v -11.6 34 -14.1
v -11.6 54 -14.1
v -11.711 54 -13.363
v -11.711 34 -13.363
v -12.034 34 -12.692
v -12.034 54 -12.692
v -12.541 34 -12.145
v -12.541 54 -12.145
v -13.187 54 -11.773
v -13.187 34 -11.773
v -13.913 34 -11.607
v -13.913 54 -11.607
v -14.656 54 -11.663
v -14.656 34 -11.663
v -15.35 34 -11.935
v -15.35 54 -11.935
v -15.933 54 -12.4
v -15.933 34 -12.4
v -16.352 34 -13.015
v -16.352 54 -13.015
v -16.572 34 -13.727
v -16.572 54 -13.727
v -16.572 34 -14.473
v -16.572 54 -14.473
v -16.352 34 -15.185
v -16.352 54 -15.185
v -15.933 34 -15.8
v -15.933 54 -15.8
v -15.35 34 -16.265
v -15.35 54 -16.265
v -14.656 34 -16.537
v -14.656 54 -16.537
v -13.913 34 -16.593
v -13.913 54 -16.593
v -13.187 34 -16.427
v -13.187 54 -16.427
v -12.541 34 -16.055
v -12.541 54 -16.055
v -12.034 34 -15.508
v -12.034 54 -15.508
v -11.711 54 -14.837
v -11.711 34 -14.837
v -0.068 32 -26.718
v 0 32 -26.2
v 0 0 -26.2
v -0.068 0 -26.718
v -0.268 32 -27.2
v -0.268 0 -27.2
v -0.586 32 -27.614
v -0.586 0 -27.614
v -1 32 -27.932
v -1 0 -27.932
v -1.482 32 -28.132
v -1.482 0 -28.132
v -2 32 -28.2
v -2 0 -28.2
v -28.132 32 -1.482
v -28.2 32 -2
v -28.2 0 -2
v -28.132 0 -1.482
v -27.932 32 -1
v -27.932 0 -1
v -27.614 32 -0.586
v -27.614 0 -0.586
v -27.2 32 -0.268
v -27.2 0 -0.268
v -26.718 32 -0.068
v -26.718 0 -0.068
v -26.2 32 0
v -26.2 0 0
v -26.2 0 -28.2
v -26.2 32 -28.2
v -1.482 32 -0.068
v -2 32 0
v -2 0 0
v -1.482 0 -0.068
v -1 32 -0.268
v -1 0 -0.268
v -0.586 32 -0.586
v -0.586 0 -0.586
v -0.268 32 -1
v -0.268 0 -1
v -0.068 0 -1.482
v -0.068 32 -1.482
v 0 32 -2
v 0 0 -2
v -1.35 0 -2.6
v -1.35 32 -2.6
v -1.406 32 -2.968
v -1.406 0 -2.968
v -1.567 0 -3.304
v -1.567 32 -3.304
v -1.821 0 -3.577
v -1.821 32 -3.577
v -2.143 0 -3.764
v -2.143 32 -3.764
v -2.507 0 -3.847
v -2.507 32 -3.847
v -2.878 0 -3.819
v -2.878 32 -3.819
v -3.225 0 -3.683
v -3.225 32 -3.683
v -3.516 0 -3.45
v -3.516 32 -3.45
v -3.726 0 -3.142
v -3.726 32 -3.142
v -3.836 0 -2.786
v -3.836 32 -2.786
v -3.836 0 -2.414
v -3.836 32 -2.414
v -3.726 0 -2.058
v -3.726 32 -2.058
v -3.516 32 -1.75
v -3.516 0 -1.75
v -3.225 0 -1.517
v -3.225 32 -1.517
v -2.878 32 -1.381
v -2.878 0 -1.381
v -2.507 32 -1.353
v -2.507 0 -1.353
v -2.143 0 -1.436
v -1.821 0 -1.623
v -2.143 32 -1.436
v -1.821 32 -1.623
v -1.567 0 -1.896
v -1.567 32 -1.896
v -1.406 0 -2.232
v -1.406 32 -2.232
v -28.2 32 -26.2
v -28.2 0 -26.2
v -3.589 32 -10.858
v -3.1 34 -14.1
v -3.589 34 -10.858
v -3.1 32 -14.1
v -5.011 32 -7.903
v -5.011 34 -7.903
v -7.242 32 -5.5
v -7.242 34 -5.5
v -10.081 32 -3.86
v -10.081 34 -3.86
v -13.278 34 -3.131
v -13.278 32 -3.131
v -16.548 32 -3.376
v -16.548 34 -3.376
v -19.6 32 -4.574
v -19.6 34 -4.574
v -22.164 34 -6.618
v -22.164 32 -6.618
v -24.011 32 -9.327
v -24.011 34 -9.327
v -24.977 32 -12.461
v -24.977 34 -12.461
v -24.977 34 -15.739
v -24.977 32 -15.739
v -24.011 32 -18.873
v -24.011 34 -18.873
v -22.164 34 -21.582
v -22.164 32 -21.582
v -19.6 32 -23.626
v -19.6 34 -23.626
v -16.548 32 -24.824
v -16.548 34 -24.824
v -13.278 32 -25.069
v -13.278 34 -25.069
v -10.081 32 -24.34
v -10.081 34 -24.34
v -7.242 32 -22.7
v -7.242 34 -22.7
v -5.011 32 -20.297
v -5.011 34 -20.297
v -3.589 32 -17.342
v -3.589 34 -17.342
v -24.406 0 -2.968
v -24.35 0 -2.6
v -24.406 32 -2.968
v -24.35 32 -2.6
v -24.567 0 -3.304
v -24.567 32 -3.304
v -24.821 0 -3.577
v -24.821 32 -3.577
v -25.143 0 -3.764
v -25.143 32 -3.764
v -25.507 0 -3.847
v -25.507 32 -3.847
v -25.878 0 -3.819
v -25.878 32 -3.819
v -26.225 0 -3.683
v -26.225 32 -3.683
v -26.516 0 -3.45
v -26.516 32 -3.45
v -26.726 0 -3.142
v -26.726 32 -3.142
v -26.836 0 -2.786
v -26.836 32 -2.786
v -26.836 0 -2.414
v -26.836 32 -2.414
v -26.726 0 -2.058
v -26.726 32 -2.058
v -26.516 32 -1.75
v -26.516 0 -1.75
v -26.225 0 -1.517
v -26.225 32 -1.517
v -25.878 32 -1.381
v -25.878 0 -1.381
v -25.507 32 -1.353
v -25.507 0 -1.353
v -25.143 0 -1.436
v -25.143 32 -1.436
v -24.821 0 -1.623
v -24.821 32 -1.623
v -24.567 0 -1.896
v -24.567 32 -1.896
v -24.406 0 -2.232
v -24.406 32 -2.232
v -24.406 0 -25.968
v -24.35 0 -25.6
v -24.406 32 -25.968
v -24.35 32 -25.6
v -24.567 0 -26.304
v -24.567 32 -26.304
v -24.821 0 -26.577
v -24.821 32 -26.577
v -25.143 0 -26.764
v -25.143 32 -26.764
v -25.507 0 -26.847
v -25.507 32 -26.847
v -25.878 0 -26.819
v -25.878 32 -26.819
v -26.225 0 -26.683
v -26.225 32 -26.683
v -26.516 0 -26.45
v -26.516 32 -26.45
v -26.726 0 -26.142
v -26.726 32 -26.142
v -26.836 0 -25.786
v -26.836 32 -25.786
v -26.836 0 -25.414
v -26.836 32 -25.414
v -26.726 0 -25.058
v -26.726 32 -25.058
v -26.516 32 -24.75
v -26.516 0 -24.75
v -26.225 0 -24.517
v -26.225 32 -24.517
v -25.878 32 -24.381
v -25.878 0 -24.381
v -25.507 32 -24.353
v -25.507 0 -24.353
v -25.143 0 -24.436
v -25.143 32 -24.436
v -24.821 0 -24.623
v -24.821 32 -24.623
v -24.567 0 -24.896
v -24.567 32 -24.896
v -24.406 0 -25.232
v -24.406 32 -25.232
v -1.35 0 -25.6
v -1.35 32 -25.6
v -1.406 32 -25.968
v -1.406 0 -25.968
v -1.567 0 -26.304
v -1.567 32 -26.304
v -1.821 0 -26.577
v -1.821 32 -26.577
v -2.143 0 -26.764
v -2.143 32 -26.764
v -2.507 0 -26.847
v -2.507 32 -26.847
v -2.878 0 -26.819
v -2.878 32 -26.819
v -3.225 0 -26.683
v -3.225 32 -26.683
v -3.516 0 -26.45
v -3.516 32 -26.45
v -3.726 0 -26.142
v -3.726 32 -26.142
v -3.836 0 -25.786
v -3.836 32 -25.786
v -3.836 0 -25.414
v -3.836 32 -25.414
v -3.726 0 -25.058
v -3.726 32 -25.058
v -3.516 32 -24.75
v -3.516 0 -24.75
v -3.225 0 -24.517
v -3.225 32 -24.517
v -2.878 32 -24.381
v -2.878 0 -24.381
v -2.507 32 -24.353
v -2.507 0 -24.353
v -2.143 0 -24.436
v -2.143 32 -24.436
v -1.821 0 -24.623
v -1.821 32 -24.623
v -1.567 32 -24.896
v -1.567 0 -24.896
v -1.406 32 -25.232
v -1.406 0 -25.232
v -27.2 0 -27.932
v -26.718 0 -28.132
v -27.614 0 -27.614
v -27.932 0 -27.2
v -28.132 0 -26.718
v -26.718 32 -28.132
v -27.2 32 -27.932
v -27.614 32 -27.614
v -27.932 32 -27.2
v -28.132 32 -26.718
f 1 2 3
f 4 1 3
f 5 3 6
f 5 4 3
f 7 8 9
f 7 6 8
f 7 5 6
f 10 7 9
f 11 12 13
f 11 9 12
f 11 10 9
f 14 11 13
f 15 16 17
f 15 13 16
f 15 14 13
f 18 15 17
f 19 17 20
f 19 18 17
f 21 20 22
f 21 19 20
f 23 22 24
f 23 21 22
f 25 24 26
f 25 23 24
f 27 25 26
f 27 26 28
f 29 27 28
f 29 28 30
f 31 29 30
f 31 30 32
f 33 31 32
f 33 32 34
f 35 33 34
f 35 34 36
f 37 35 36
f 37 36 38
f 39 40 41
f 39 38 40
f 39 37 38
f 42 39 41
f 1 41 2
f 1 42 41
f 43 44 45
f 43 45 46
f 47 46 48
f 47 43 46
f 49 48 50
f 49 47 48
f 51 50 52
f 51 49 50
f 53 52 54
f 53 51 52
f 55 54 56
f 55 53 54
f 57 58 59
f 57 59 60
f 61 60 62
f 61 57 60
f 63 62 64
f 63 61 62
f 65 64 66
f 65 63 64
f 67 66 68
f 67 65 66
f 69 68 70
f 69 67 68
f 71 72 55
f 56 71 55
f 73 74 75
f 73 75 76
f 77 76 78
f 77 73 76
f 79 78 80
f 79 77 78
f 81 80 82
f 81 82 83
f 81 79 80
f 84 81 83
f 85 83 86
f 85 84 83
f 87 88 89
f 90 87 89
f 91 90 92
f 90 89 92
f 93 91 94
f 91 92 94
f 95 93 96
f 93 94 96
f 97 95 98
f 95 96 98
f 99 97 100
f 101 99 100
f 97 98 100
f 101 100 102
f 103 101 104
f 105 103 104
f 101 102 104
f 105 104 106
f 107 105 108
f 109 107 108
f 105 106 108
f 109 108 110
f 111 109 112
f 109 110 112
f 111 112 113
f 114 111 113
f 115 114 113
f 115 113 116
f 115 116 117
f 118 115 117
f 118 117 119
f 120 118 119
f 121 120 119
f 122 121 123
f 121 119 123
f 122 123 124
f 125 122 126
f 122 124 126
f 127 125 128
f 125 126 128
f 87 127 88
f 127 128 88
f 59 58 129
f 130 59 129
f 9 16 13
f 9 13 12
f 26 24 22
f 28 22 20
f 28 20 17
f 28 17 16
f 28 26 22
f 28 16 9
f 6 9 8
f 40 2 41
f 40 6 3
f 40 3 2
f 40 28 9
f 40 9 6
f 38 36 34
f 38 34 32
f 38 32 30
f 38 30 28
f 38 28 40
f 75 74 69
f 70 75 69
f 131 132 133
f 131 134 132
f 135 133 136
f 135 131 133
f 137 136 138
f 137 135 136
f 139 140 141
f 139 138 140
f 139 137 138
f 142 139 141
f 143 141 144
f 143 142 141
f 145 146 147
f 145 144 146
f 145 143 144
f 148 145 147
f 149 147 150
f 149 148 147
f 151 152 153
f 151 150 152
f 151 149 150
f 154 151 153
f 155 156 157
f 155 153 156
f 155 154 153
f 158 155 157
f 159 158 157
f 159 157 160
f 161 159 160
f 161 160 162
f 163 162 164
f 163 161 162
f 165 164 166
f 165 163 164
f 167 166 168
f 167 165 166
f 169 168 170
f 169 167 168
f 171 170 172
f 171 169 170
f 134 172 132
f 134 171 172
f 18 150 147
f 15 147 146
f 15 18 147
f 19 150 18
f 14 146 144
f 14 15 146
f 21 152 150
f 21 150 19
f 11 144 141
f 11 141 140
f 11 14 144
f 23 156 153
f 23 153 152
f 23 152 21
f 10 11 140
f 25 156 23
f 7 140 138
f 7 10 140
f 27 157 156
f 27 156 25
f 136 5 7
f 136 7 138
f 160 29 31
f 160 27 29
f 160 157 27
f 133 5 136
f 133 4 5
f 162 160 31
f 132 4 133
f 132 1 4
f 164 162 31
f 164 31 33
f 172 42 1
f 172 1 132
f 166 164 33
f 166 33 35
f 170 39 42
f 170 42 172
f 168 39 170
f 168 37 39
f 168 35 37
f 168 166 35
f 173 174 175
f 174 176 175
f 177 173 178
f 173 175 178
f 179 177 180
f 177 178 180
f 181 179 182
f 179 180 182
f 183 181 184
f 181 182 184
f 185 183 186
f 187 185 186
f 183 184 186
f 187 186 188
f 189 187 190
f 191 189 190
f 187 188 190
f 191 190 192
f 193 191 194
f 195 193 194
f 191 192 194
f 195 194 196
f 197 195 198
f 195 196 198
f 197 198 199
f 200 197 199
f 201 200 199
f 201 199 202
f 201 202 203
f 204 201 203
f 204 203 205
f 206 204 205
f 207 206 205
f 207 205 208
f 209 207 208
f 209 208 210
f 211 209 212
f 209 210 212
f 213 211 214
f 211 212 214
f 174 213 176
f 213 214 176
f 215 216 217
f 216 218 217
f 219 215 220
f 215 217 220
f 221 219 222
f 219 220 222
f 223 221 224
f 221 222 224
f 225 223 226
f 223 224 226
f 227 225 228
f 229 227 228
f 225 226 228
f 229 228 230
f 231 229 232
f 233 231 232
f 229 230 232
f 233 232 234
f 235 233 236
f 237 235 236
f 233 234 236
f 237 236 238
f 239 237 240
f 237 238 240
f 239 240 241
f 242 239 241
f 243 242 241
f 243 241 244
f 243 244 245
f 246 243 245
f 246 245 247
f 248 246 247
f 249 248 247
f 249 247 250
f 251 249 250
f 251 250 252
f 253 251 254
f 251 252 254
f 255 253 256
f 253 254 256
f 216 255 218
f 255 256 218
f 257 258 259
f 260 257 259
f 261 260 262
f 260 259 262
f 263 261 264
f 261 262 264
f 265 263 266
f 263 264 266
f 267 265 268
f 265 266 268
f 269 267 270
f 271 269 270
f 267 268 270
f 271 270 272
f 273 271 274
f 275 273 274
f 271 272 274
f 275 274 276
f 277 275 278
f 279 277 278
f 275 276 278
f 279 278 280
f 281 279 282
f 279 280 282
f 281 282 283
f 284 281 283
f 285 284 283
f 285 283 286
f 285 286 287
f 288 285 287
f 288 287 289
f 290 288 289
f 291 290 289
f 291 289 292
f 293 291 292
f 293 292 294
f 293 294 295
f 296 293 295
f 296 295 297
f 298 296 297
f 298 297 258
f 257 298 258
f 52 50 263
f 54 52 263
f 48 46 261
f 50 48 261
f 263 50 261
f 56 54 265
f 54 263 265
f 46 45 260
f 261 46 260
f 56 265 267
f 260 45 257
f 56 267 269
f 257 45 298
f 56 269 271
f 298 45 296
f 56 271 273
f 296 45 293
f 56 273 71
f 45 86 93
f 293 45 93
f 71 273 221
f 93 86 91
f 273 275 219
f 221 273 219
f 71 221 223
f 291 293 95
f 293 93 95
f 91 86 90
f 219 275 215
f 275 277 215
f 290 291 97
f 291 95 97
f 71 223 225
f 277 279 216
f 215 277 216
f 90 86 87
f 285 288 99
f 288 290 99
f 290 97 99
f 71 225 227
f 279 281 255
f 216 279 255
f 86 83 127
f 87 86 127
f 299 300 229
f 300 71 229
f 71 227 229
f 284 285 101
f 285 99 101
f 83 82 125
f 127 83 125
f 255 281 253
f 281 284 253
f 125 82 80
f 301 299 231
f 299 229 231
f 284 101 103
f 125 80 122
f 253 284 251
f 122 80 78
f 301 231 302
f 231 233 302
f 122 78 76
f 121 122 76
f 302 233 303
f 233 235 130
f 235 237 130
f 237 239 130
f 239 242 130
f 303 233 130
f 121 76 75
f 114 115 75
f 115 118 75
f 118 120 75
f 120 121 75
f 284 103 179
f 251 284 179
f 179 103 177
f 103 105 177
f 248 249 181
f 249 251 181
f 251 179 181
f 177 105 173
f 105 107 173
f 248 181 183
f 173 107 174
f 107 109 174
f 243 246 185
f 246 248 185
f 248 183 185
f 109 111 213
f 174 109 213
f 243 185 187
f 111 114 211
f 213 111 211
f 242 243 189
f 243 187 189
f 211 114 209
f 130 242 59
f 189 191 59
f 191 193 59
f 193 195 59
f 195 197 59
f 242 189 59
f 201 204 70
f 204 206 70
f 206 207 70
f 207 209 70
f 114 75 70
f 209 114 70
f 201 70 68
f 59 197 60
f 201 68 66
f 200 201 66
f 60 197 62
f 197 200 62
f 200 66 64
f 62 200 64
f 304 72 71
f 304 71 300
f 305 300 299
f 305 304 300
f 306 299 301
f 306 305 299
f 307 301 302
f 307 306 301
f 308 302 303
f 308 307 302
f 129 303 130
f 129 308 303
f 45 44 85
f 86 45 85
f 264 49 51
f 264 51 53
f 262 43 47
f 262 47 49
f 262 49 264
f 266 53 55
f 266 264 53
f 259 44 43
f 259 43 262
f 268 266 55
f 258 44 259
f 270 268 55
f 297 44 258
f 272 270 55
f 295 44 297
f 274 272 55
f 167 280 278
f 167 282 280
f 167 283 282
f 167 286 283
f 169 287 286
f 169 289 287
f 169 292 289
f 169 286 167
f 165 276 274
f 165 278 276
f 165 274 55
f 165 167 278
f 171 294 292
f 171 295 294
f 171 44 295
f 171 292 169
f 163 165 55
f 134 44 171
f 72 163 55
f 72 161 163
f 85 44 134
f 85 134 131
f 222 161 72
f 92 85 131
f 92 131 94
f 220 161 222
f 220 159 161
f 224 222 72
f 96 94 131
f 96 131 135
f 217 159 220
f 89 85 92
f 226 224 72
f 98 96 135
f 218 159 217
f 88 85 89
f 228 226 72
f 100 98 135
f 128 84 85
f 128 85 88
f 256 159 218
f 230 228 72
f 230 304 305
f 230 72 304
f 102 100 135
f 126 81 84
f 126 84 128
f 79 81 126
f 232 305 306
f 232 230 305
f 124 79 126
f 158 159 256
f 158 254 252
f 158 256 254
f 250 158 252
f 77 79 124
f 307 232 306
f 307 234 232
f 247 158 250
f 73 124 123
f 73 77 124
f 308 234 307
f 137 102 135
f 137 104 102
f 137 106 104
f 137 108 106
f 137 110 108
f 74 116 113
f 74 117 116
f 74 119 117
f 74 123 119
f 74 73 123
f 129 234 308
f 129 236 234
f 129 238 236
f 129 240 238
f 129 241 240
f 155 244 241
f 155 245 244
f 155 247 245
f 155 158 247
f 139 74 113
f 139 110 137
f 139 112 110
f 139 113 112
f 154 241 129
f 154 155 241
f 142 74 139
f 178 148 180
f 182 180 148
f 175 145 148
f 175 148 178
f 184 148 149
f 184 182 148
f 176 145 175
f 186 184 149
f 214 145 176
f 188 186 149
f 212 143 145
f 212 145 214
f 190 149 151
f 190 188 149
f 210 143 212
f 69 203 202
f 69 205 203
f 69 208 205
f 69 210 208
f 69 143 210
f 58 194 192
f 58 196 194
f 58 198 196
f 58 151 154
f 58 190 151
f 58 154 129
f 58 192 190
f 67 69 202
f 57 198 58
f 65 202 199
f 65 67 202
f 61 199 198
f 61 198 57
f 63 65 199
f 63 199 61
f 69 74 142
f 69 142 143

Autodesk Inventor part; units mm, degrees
ref_plane "YZ Plane" through (0, 0, 0) normal (1, 0, 0) x (0, 1, 0)
ref_plane "XZ Plane" through (0, 0, 0) normal (0, 1, 0) x (-1, 0, 0)
ref_plane "XY Plane" through (0, 0, 0) normal (0, 0, 1) x (1, 0, 0)
sketch "Sketch1" plane through (0, 0, 0) normal (0, 1, 0) x (-1, 0, 0)
  point P0 (0, 0)
sketch "Sketch2" plane through (0, 0, 0) normal (0, 1, 0) x (-1, 0, 0)
  line L0 (0, 0) -> (28.2, 0)
  line L1 (28.2, 0) -> (28.2, -28.2)
  line L2 (28.2, -28.2) -> (0, -28.2)
  line L3 (0, -28.2) -> (0, 0)
  dimension "d0" = 28.2
  dimension "d1" = 28.2
extrude "Extrusion1" add sketch "Sketch2" along normal blind 32
sketch "Sketch3" plane through (0, 32, 0) normal (0, 1, 0) x (1, 0, 0)
  circle A0 centre (-14.1, 14.1) radius 11
  point P0 (0, 0)
  dimension "d4" = 22
extrude "Extrusion2" add sketch "Sketch3" along normal blind 2
sketch "Sketch4" plane through (-14.1, 34, -14.1) normal (0, 1, 0) x (1, 0, 0)
  circle A0 centre (0, 0) radius 2.5
  point P0 (14.1, -14.1)
  dimension "d7" = 5
extrude "Extrusion3" add sketch "Sketch4" along normal blind 20
sketch "Sketch5" plane through (0, 32, 0) normal (0, 1, 0) x (1, 0, 0)
  circle A0 centre (-25.6, 2.6) radius 1.25
  line L0 (-28.2, 28.2) -> (-28.2, 0) projected
  line L1 (-28.2, 0) -> (0, 0) projected
  circle A1 centre (-25.6, 25.6) radius 1.25
  circle A2 centre (-2.6, 2.6) radius 1.25
  circle A3 centre (-2.6, 25.6) radius 1.25
  dimension "d10" = 2.5
  dimension "d11" = 2.6
  dimension "d12" = 2.6
  dimension "d13" = 2.5
  dimension "d14" = 23
  dimension "d15" = 2.5
  dimension "d16" = 23
  dimension "d17" = 2.5
extrude "Extrusion4" cut sketch "Sketch5" against normal through all
fillet "Fillet1" radius 2 4 edges at (0, 16, 0) (0, 16, -28.2) (-28.2, 16, -28.2) (-28.2, 16, 0)
properties part number "NEMA11"
